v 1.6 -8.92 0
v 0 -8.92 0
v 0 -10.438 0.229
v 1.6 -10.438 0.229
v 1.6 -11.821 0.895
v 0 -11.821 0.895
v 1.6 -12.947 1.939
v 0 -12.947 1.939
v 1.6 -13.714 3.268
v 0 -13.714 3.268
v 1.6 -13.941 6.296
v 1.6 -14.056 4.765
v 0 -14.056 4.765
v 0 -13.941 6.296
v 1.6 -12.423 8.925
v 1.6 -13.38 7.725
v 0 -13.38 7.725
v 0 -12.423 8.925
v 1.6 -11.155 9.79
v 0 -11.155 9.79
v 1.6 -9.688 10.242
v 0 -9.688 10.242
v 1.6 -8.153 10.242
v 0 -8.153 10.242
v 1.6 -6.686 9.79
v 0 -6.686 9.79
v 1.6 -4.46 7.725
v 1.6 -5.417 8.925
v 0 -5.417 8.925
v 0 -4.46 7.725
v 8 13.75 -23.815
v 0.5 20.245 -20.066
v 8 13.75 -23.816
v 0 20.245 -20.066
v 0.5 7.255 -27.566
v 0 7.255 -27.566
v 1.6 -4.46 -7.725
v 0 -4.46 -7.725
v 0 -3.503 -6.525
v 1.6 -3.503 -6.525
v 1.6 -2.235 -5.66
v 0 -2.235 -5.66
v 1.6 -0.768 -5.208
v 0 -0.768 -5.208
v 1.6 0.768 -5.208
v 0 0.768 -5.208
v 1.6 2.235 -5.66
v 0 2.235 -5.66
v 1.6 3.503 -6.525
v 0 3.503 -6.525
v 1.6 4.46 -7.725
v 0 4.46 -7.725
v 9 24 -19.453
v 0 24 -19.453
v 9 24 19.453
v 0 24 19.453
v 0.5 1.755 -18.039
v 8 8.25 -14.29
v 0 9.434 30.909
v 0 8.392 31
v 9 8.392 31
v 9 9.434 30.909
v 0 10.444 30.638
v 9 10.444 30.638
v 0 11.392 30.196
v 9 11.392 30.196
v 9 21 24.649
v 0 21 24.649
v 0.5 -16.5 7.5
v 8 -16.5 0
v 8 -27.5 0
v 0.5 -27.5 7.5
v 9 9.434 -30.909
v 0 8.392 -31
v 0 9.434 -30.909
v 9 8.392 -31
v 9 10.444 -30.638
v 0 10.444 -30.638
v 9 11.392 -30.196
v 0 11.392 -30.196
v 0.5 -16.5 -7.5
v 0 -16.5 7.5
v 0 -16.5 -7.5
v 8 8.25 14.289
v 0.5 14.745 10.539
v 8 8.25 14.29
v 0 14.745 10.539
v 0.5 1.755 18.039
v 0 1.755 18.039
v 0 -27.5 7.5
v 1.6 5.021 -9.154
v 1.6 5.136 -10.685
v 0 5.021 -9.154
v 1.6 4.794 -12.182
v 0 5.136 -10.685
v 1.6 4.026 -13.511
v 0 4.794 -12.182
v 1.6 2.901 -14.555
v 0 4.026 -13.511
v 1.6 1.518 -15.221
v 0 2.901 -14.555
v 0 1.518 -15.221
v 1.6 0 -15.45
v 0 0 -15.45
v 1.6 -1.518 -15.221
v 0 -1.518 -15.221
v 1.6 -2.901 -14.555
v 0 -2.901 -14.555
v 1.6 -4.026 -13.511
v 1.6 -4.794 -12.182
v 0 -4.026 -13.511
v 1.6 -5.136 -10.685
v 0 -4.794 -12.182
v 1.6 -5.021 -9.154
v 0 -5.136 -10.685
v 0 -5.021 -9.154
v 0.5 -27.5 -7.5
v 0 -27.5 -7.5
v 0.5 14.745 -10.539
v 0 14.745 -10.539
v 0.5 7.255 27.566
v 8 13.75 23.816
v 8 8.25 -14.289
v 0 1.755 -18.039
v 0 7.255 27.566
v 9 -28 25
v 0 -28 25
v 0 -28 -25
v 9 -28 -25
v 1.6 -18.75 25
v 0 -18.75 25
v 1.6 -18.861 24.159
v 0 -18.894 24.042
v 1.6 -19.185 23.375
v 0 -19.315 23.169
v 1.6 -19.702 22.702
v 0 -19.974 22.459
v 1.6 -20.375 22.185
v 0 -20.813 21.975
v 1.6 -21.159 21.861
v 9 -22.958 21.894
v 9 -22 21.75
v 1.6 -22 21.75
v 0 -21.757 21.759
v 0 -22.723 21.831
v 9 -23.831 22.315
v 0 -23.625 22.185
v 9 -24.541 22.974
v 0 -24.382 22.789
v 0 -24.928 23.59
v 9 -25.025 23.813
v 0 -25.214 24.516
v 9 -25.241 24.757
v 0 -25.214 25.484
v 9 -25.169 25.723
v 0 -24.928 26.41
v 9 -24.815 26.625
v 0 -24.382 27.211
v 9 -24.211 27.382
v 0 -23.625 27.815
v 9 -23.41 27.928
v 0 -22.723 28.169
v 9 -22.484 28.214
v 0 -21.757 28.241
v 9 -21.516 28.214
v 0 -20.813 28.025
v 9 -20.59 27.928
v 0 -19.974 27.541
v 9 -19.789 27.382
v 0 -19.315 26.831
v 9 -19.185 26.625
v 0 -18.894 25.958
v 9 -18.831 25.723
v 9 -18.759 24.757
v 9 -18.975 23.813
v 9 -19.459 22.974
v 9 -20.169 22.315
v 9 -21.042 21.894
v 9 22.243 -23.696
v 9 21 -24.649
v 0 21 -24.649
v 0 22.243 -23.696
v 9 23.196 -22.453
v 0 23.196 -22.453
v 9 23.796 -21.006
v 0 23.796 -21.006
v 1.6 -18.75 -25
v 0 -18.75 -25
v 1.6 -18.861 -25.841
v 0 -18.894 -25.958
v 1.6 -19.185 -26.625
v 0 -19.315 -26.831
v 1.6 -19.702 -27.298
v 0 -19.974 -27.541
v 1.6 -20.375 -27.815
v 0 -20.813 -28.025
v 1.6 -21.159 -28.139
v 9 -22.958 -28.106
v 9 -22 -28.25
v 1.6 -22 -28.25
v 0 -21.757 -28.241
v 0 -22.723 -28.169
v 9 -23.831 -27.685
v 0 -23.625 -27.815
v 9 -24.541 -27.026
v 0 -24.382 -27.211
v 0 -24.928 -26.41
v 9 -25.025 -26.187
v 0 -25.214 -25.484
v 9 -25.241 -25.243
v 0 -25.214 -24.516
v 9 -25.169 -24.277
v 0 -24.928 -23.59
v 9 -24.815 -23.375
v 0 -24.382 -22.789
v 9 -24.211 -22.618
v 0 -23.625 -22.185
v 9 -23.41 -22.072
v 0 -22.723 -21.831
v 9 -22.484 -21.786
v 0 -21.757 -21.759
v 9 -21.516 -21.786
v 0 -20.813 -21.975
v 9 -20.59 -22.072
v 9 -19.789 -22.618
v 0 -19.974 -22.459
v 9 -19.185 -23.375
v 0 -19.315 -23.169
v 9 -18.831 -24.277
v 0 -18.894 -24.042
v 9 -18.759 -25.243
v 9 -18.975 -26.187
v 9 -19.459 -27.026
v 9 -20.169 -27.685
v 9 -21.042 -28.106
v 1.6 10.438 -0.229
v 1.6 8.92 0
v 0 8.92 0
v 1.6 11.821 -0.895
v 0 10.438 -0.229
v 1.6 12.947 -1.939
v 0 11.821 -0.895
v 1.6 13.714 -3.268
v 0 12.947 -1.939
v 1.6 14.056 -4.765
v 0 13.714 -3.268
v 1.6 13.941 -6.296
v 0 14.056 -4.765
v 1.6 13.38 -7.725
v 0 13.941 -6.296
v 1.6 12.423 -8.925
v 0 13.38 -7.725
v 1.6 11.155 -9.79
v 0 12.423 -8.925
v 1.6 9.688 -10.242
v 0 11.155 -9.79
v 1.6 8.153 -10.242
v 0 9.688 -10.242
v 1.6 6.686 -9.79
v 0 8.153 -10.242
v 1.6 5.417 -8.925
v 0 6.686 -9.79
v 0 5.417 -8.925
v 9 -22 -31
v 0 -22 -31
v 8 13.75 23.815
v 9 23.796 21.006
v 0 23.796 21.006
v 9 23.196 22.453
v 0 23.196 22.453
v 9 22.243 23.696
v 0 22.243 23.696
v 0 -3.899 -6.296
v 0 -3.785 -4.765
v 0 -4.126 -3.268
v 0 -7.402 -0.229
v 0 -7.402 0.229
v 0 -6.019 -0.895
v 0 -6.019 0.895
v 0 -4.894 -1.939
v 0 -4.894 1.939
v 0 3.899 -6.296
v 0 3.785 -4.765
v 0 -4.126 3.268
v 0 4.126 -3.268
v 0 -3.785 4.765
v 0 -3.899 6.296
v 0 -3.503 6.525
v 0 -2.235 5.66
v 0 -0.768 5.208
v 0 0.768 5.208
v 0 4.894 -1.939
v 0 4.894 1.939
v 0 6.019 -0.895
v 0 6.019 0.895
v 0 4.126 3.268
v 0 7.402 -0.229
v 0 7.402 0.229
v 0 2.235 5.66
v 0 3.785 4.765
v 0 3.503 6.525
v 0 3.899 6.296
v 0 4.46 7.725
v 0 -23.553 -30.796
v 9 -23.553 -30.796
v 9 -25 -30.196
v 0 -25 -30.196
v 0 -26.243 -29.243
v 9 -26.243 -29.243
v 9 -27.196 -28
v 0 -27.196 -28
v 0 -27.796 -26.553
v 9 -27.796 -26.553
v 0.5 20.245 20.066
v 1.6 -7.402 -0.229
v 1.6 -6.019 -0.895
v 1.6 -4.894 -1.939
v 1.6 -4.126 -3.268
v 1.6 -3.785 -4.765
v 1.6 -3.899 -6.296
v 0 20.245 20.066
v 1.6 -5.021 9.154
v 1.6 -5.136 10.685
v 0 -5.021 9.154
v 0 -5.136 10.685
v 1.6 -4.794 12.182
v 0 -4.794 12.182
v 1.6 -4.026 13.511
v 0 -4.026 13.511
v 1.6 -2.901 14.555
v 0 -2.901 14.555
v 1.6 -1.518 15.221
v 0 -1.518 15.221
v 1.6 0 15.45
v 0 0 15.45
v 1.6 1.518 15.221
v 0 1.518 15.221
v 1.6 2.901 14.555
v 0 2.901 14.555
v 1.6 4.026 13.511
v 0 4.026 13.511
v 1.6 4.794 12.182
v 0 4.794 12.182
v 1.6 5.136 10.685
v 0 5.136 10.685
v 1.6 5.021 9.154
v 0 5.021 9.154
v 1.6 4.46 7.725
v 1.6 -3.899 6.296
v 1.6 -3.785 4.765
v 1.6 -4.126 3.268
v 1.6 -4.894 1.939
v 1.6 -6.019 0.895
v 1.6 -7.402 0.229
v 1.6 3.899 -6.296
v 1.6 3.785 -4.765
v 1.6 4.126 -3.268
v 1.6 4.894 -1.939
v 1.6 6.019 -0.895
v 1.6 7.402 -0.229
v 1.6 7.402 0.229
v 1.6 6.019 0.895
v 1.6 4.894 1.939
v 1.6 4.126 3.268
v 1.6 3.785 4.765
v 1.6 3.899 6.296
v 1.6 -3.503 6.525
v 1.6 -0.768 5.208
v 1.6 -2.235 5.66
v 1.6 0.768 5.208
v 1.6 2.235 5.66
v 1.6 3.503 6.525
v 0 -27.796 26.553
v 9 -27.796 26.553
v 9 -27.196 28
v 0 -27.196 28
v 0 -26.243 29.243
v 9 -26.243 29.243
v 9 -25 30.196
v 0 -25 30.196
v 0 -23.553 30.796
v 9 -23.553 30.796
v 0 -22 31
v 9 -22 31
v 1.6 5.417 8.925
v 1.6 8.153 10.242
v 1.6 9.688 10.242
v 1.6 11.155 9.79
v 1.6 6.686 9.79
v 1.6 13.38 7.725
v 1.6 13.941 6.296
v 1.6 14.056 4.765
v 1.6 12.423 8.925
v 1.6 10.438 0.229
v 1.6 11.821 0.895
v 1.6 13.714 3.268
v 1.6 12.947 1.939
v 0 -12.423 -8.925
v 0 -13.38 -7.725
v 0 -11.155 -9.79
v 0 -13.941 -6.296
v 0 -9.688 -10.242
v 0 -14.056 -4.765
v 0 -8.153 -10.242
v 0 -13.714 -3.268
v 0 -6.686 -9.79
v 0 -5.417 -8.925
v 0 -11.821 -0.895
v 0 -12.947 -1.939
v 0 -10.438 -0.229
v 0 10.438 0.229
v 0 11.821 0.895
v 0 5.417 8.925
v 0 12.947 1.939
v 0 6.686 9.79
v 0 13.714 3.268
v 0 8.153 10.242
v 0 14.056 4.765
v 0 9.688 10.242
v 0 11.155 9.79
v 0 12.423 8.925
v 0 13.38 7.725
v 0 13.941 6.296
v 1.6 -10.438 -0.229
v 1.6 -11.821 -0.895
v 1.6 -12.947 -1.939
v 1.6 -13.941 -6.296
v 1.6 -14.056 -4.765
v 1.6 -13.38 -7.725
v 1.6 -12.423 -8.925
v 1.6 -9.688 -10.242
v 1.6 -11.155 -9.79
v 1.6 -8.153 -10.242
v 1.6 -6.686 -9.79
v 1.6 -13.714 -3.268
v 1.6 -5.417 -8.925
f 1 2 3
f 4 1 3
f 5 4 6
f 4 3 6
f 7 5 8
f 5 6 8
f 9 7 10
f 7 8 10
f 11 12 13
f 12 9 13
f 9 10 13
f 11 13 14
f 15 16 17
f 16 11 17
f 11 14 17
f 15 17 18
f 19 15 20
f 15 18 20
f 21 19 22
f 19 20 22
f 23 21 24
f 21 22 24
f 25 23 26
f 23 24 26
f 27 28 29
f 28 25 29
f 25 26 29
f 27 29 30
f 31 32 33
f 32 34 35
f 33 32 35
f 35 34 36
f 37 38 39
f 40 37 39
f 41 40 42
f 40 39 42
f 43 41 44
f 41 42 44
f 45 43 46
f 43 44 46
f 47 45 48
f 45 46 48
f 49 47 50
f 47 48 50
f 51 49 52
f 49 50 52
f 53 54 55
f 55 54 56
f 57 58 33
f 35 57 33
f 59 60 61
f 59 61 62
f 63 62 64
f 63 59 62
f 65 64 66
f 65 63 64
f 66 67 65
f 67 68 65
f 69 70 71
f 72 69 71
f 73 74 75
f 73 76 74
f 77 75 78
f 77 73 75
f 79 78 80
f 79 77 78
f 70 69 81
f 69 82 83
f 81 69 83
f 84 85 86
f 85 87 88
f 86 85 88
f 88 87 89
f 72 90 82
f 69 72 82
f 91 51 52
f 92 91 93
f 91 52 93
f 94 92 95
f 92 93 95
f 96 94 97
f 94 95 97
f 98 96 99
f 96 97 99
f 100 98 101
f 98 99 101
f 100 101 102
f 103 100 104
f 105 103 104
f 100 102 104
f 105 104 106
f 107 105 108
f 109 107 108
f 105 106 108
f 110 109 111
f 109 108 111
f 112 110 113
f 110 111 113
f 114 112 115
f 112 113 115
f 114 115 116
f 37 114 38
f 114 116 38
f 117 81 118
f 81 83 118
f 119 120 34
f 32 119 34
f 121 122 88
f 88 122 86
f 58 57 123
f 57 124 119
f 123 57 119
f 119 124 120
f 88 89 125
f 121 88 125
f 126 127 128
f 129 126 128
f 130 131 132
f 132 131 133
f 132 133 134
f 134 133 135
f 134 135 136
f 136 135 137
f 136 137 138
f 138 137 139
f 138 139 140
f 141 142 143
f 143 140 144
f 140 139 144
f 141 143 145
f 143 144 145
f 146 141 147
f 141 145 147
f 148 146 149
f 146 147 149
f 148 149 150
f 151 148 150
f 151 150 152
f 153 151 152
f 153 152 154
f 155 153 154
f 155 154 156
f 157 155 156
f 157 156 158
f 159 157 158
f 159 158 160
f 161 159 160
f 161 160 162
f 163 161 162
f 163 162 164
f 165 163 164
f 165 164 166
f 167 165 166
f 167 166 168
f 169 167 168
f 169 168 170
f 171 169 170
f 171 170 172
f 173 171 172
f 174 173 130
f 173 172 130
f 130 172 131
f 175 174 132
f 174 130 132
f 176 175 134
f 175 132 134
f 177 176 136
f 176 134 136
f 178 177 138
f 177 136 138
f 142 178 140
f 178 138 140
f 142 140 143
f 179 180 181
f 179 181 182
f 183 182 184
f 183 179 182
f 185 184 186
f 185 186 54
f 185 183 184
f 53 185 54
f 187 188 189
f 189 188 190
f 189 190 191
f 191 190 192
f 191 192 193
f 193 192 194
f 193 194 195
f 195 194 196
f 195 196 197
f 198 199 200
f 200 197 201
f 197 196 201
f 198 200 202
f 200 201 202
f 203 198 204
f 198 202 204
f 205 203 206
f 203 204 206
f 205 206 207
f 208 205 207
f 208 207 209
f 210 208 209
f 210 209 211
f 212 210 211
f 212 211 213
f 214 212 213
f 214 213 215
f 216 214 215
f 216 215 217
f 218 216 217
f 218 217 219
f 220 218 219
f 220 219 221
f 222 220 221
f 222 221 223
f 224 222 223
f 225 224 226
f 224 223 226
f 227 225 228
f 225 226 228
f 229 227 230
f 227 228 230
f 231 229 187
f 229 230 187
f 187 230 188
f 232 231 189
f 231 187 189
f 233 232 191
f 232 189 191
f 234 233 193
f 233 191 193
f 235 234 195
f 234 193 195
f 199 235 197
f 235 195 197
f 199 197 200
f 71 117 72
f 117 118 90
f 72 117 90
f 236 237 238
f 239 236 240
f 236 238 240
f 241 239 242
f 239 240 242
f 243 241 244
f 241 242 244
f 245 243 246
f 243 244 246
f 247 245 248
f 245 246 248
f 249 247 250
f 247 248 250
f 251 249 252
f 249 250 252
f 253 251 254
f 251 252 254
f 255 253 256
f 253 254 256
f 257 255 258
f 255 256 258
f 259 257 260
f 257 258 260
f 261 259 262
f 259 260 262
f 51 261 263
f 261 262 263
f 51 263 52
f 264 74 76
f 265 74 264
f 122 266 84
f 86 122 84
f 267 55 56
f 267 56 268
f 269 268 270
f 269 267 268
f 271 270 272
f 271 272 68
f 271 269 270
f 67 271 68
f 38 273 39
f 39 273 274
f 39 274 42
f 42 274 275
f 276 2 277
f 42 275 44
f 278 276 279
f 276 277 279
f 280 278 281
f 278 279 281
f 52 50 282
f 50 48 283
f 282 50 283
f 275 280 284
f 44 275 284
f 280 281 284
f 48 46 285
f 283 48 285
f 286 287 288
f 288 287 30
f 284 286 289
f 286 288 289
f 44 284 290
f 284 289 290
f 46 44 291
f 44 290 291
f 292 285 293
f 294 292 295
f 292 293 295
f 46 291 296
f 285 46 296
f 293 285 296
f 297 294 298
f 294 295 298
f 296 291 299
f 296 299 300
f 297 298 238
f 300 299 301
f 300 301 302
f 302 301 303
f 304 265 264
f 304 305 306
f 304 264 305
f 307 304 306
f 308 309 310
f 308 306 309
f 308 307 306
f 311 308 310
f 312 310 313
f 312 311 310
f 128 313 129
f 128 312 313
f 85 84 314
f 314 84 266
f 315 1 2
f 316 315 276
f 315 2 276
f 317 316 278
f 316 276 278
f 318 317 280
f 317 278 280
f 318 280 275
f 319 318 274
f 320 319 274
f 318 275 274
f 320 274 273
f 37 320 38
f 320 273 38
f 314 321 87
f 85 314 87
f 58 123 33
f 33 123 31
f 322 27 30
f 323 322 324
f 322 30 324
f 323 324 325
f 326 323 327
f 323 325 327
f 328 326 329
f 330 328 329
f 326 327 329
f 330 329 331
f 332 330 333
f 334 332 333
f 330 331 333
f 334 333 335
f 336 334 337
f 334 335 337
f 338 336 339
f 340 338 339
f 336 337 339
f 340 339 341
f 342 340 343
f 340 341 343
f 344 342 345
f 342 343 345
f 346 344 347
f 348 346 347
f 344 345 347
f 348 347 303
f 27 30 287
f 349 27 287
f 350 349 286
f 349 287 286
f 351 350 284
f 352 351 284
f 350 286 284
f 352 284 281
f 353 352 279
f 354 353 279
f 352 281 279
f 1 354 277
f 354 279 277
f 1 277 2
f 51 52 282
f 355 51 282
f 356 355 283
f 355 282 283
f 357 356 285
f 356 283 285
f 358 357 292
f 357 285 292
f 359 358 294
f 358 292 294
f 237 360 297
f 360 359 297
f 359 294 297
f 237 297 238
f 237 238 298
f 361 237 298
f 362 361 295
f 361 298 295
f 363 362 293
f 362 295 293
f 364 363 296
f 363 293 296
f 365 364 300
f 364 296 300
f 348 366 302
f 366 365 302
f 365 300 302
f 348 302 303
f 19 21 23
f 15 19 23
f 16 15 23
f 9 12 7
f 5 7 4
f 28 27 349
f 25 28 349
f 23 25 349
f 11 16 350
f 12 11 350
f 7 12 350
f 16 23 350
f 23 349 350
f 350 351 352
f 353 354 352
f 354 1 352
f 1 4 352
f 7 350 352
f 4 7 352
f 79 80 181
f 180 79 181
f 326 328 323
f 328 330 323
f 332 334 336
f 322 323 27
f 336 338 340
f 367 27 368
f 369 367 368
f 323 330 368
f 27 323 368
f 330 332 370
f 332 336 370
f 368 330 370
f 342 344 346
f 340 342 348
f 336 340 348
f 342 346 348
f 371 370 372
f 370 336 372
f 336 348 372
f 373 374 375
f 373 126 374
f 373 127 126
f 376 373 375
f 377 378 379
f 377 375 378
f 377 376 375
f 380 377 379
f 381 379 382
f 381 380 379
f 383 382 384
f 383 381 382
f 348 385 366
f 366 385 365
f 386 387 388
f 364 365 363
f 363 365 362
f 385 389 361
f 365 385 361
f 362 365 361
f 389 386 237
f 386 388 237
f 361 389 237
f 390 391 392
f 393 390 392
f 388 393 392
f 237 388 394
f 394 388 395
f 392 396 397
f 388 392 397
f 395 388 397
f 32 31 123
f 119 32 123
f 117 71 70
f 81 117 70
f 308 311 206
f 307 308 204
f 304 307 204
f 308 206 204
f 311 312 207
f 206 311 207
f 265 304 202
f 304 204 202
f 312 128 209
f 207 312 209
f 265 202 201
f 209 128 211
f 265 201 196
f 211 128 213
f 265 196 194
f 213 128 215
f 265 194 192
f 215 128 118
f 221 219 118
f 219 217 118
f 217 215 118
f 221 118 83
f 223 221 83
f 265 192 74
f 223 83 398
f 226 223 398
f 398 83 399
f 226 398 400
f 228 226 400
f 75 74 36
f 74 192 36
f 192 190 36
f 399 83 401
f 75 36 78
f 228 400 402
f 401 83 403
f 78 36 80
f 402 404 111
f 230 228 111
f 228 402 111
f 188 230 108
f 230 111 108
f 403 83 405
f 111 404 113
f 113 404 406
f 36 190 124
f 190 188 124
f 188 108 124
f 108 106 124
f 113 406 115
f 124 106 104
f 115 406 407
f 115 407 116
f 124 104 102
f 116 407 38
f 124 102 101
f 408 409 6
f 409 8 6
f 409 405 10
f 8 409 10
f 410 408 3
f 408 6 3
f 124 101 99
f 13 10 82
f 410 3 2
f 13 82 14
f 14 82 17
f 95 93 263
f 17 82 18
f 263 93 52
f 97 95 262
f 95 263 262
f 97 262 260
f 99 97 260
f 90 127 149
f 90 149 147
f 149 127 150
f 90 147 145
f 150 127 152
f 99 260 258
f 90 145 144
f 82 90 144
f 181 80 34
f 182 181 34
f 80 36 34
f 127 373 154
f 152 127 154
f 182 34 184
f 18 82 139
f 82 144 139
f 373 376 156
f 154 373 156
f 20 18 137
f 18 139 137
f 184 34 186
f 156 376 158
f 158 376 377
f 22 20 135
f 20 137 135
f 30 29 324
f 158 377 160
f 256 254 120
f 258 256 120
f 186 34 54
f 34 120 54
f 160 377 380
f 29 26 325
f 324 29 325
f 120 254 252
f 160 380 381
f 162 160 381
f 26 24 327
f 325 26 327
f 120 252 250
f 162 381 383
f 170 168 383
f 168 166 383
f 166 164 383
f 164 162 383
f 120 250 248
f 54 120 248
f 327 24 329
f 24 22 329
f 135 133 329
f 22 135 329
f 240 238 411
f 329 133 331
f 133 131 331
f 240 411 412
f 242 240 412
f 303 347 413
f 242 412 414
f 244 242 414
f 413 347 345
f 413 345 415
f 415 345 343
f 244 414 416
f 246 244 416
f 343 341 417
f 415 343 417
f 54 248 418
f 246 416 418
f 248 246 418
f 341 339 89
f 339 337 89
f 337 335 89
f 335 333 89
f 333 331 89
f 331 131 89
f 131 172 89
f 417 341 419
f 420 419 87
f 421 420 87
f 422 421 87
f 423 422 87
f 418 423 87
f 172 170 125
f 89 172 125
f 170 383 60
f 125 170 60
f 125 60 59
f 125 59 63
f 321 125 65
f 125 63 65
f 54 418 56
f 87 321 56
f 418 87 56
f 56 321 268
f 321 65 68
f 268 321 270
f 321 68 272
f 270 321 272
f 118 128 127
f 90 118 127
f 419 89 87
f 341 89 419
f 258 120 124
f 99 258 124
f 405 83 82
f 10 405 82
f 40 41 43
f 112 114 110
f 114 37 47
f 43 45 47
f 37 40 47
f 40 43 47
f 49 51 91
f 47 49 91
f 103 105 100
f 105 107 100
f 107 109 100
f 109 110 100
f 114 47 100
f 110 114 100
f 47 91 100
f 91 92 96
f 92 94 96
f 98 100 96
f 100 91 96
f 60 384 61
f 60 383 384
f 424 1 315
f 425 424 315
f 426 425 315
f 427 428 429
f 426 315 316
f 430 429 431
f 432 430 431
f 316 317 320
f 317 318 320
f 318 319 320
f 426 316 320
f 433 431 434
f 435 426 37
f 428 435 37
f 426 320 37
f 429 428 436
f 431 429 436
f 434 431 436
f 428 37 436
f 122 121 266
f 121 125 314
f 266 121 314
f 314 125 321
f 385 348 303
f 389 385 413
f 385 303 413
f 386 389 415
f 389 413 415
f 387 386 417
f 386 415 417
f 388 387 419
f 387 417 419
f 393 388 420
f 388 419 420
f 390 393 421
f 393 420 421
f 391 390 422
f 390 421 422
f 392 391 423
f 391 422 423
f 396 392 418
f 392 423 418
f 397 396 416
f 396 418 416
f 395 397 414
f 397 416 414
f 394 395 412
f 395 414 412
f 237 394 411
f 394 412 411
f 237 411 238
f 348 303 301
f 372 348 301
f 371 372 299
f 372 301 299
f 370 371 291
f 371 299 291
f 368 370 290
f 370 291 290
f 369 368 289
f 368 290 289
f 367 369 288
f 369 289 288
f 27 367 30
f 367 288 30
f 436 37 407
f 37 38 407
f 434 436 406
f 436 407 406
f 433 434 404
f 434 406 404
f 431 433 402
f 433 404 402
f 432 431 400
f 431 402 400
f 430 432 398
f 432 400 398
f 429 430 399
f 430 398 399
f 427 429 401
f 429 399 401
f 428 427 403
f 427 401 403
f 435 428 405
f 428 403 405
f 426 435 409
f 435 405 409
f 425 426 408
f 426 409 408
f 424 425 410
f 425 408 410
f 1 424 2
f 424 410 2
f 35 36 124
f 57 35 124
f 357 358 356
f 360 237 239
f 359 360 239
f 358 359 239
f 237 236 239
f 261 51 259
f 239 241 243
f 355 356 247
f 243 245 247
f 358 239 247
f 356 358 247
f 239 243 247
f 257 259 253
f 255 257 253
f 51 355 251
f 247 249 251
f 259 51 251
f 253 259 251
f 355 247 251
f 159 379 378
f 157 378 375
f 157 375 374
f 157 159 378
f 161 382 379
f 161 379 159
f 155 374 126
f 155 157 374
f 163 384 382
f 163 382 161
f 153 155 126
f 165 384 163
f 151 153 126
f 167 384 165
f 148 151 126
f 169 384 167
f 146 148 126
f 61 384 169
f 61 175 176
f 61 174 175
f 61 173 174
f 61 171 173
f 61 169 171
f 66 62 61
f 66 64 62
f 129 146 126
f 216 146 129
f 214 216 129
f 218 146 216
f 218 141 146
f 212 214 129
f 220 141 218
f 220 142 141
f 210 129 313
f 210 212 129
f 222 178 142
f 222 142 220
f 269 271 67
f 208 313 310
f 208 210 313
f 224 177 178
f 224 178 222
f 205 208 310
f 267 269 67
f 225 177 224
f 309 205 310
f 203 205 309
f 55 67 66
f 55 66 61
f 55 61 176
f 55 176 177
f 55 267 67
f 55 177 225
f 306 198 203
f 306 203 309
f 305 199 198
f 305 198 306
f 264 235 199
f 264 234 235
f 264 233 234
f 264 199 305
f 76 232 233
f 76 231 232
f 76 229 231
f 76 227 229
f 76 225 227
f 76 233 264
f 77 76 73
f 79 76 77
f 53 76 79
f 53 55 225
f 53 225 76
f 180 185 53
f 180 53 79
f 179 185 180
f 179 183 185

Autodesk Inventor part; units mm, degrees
ref_plane "YZ Plane" through (0, 0, 0) normal (1, 0, 0) x (0, 1, 0)
ref_plane "XZ Plane" through (0, 0, 0) normal (0, 1, 0) x (-1, 0, 0)
ref_plane "XY Plane" through (0, 0, 0) normal (0, 0, 1) x (1, 0, 0)
sketch "Sketch1" plane through (0, 0, 0) normal (1, 0, 0) x (0, 1, 0)
  circle A0 centre (8.9201, -5.15) radius 5.15
  circle A1 centre (8.9201, 5.15) radius 5.15
  circle A2 centre (0, 10.3) radius 5.15
  circle A3 centre (-8.9201, 5.15) radius 5.15
  circle A4 centre (-8.9201, -5.15) radius 5.15
  circle A5 centre (0, -10.3) radius 5.15
  line L0 (-27.5, 7.5) -> (-16.5, 7.5)
  line L1 (-16.5, 7.5) -> (-16.5, -7.5)
  line L2 (-16.5, -7.5) -> (-27.5, -7.5)
  line L3 (-27.5, -7.5) -> (-27.5, 7.5)
  line L4 (-27.5, 7.5) -> (-16.5, -7.5) construction
  line L5 (-16.5, 7.5) -> (-27.5, -7.5) construction
  line L6 (14.7452, -10.5394) -> (20.2452, -20.0657)
  line L7 (1.7548, -18.0394) -> (14.7452, -10.5394)
  line L8 (7.2548, -27.5657) -> (1.7548, -18.0394)
  line L9 (20.2452, -20.0657) -> (7.2548, -27.5657)
  line L10 (1.7548, 18.0394) -> (7.2548, 27.5657)
  line L11 (14.7452, 10.5394) -> (1.7548, 18.0394)
  line L12 (20.2452, 20.0657) -> (14.7452, 10.5394)
  line L13 (7.2548, 27.5657) -> (20.2452, 20.0657)
  circle A6 centre (-22, 25) radius 3.25
  circle A7 centre (-22, -25) radius 3.25
  arc A8 (-22, 31) -> (-28, 25) centre (-22, 25) ccw
  arc A9 (-28, -25) -> (-22, -31) centre (-22, -25) ccw
  line L14 (-28, 25) -> (-28, -25)
  line L15 (-22, 31) -> (10, 31)
  line L16 (10, -31) -> (-22, -31)
  line L17 (10, -31) -> (24, -22.9171)
  line L18 (24, -22.9171) -> (24, 22.9171)
  line L19 (24, 22.9171) -> (10, 31)
  point P0 (0, 0)
  point P1 (-22, 0)
  point P2 (-4.46, -7.725)
  point P3 (-8.9201, 0)
  point P4 (-4.46, 7.725)
  point P5 (4.46, 7.725)
  point P6 (8.9201, 0)
  point P7 (4.46, -7.725)
  dimension "d0" = 10.3
  dimension "d3" = 360
  dimension "d5" = 15
  dimension "d6" = 11
  dimension "d7" = 22
  dimension "d10" = 360
  dimension "d12" = 25
  dimension "d13" = 50
  dimension "d14" = 6.5
  dimension "d15" = 12
  dimension "d29" = 10
  dimension "d31" = 24
extrude "Layer1_Magnets_16" add sketch "Sketch1" along normal blind 1.6 contours A0 A5 A4 A3 A2 A1 | L15 L19 L18 L17 L16 A9 L14 A8
sketch "Sketch2" plane through (1.6, 0, 0) normal (1, 0, 0) x (0, 0, -1)
  arc A0 (-31, -22) -> (-25, -28) centre (-25, -22) ccw projected
  line L0 (-25, -28) -> (25, -28) projected
  arc A1 (25, -28) -> (31, -22) centre (25, -22) ccw projected
  line L1 (31, -22) -> (31, 10) projected
  line L2 (-31, 10) -> (-31, -22) projected
  arc A2 (7.725, -4.46) -> (7.725, 4.46) centre (10.3, 0) ccw projected
  arc A3 (0, -8.9201) -> (7.725, -4.46) centre (5.15, -8.9201) ccw projected
  arc A4 (-7.725, -4.46) -> (0, -8.9201) centre (-5.15, -8.9201) ccw projected
  arc A5 (-7.725, 4.46) -> (-7.725, -4.46) centre (-10.3, 0) ccw projected
  arc A6 (0, 8.9201) -> (-7.725, 4.46) centre (-5.15, 8.9201) ccw projected
  arc A7 (7.725, 4.46) -> (0, 8.9201) centre (5.15, 8.9201) ccw projected
  circle A8 centre (25, -22) radius 3.25 projected
  circle A9 centre (-25, -22) radius 3.25 projected
  line L3 (-18.0394, 1.7548) -> (-27.5657, 7.2548) projected
  line L4 (-27.5657, 7.2548) -> (-20.0657, 20.2452) projected
  line L5 (-20.0657, 20.2452) -> (-10.5394, 14.7452) projected
  line L6 (-10.5394, 14.7452) -> (-18.0394, 1.7548) projected
  line L7 (10.5394, 14.7452) -> (20.0657, 20.2452) projected
  line L8 (20.0657, 20.2452) -> (27.5657, 7.2548) projected
  line L9 (27.5657, 7.2548) -> (18.0394, 1.7548) projected
  line L10 (18.0394, 1.7548) -> (10.5394, 14.7452) projected
  line L11 (-7.5, -27.5) -> (-7.5, -16.5) projected
  line L12 (-7.5, -16.5) -> (7.5, -16.5) projected
  line L13 (7.5, -16.5) -> (7.5, -27.5) projected
  line L14 (7.5, -27.5) -> (-7.5, -27.5) projected
  arc A10 (0, 8.9201) -> (7.725, 4.46) centre (5.15, 8.9201) ccw projected
  arc A11 (-7.725, 4.46) -> (0, 8.9201) centre (-5.15, 8.9201) ccw projected
  arc A12 (-7.725, -4.46) -> (-7.725, 4.46) centre (-10.3, 0) ccw projected
  arc A13 (0, -8.9201) -> (-7.725, -4.46) centre (-5.15, -8.9201) ccw projected
  arc A14 (7.725, -4.46) -> (0, -8.9201) centre (5.15, -8.9201) ccw projected
  arc A15 (7.725, 4.46) -> (7.725, -4.46) centre (10.3, 0) ccw projected
  line L15 (31, 10) -> (22.9171, 24) projected
  line L16 (22.9171, 24) -> (-22.9171, 24) projected
  line L17 (-22.9171, 24) -> (-31, 10) projected
  point P0 (0, 0)
  point P1 (-7.725, 4.46)
  point P2 (-7.725, 4.46)
  point P3 (-7.725, 4.46)
  point P4 (-7.725, -4.46)
  point P5 (-7.725, -4.46)
  point P6 (-7.725, -4.46)
  point P7 (-7.725, -4.46)
  point P8 (0, -8.9201)
  point P9 (0, -8.9201)
  point P10 (0, -8.9201)
  point P11 (7.725, 4.46)
  point P12 (7.725, 4.46)
  point P13 (0, 8.9201)
  point P14 (0, 8.9201)
extrude "Layer2_Coupler_80" add sketch "Sketch2" along normal blind 6.4 contours L2 L17 L16 L15 L1 A1 L0 A0 | A15 A2 | A3 A14 | A14 A13 A12 A11 A10 A15 | A10 A7 | A4 A13 | A11 A6 | A5 A12
sketch "Sketch3" plane through (8, 0, 0) normal (1, 0, 0) x (0, 0, -1)
  circle A0 centre (25, -22) radius 3.25 projected
  circle A1 centre (-25, -22) radius 3.25 projected
  line L0 (-18.0394, 1.7548) -> (-27.5657, 7.2548) projected
  line L1 (-27.5657, 7.2548) -> (-20.0657, 20.2452) projected
  line L2 (-20.0657, 20.2452) -> (-10.5394, 14.7452) projected
  line L3 (-10.5394, 14.7452) -> (-18.0394, 1.7548) projected
  line L4 (10.5394, 14.7452) -> (20.0657, 20.2452) projected
  line L5 (20.0657, 20.2452) -> (27.5657, 7.2548) projected
  line L6 (27.5657, 7.2548) -> (18.0394, 1.7548) projected
  line L7 (18.0394, 1.7548) -> (10.5394, 14.7452) projected
  line L8 (-7.5, -27.5) -> (-7.5, -16.5) projected
  line L9 (-7.5, -16.5) -> (7.5, -16.5) projected
  line L10 (7.5, -16.5) -> (7.5, -27.5) projected
  line L11 (7.5, -27.5) -> (-7.5, -27.5) projected
  line L12 (-25, -28) -> (25, -28) projected
  arc A2 (25, -28) -> (31, -22) centre (25, -22) ccw projected
  line L13 (31, -22) -> (31, 10) projected
  line L14 (-31, 10) -> (-31, -22) projected
  arc A3 (-31, -22) -> (-25, -28) centre (-25, -22) ccw projected
  line L15 (22.9171, 24) -> (-22.9171, 24) projected
  line L16 (-22.9171, 24) -> (-31, 10) projected
  line L17 (31, 10) -> (22.9171, 24) projected
  point P0 (0, 0)
extrude "Layer3_Cover_90" add sketch "Sketch3" along normal blind 1 contours L0 L1 L2 L3 | L4 L5 L6 L7 | L8 L9 L10 L11 | A3 L14 L16 L15 L17 L13 A2 L12
chamfer "CouplerL" distance 7.5 angle 45 6 edges at (8, -22, 7.5) (8, -22, -7.5) (8, 4.5048, -22.8026) (8, 17.4952, -15.3026) (8, 17.4952, 15.3026) (8, 4.5048, 22.8026)
fillet "EdgeRadius" radius 6 4 edges at (4.5, 10, -31) (4.5, 10, 31) (4.5, 24, 22.9171) (4.5, 24, -22.9171)
equation "\"d13\" = 2 * d12"
properties part number "Tool_Template" material "ABS Plastic"
